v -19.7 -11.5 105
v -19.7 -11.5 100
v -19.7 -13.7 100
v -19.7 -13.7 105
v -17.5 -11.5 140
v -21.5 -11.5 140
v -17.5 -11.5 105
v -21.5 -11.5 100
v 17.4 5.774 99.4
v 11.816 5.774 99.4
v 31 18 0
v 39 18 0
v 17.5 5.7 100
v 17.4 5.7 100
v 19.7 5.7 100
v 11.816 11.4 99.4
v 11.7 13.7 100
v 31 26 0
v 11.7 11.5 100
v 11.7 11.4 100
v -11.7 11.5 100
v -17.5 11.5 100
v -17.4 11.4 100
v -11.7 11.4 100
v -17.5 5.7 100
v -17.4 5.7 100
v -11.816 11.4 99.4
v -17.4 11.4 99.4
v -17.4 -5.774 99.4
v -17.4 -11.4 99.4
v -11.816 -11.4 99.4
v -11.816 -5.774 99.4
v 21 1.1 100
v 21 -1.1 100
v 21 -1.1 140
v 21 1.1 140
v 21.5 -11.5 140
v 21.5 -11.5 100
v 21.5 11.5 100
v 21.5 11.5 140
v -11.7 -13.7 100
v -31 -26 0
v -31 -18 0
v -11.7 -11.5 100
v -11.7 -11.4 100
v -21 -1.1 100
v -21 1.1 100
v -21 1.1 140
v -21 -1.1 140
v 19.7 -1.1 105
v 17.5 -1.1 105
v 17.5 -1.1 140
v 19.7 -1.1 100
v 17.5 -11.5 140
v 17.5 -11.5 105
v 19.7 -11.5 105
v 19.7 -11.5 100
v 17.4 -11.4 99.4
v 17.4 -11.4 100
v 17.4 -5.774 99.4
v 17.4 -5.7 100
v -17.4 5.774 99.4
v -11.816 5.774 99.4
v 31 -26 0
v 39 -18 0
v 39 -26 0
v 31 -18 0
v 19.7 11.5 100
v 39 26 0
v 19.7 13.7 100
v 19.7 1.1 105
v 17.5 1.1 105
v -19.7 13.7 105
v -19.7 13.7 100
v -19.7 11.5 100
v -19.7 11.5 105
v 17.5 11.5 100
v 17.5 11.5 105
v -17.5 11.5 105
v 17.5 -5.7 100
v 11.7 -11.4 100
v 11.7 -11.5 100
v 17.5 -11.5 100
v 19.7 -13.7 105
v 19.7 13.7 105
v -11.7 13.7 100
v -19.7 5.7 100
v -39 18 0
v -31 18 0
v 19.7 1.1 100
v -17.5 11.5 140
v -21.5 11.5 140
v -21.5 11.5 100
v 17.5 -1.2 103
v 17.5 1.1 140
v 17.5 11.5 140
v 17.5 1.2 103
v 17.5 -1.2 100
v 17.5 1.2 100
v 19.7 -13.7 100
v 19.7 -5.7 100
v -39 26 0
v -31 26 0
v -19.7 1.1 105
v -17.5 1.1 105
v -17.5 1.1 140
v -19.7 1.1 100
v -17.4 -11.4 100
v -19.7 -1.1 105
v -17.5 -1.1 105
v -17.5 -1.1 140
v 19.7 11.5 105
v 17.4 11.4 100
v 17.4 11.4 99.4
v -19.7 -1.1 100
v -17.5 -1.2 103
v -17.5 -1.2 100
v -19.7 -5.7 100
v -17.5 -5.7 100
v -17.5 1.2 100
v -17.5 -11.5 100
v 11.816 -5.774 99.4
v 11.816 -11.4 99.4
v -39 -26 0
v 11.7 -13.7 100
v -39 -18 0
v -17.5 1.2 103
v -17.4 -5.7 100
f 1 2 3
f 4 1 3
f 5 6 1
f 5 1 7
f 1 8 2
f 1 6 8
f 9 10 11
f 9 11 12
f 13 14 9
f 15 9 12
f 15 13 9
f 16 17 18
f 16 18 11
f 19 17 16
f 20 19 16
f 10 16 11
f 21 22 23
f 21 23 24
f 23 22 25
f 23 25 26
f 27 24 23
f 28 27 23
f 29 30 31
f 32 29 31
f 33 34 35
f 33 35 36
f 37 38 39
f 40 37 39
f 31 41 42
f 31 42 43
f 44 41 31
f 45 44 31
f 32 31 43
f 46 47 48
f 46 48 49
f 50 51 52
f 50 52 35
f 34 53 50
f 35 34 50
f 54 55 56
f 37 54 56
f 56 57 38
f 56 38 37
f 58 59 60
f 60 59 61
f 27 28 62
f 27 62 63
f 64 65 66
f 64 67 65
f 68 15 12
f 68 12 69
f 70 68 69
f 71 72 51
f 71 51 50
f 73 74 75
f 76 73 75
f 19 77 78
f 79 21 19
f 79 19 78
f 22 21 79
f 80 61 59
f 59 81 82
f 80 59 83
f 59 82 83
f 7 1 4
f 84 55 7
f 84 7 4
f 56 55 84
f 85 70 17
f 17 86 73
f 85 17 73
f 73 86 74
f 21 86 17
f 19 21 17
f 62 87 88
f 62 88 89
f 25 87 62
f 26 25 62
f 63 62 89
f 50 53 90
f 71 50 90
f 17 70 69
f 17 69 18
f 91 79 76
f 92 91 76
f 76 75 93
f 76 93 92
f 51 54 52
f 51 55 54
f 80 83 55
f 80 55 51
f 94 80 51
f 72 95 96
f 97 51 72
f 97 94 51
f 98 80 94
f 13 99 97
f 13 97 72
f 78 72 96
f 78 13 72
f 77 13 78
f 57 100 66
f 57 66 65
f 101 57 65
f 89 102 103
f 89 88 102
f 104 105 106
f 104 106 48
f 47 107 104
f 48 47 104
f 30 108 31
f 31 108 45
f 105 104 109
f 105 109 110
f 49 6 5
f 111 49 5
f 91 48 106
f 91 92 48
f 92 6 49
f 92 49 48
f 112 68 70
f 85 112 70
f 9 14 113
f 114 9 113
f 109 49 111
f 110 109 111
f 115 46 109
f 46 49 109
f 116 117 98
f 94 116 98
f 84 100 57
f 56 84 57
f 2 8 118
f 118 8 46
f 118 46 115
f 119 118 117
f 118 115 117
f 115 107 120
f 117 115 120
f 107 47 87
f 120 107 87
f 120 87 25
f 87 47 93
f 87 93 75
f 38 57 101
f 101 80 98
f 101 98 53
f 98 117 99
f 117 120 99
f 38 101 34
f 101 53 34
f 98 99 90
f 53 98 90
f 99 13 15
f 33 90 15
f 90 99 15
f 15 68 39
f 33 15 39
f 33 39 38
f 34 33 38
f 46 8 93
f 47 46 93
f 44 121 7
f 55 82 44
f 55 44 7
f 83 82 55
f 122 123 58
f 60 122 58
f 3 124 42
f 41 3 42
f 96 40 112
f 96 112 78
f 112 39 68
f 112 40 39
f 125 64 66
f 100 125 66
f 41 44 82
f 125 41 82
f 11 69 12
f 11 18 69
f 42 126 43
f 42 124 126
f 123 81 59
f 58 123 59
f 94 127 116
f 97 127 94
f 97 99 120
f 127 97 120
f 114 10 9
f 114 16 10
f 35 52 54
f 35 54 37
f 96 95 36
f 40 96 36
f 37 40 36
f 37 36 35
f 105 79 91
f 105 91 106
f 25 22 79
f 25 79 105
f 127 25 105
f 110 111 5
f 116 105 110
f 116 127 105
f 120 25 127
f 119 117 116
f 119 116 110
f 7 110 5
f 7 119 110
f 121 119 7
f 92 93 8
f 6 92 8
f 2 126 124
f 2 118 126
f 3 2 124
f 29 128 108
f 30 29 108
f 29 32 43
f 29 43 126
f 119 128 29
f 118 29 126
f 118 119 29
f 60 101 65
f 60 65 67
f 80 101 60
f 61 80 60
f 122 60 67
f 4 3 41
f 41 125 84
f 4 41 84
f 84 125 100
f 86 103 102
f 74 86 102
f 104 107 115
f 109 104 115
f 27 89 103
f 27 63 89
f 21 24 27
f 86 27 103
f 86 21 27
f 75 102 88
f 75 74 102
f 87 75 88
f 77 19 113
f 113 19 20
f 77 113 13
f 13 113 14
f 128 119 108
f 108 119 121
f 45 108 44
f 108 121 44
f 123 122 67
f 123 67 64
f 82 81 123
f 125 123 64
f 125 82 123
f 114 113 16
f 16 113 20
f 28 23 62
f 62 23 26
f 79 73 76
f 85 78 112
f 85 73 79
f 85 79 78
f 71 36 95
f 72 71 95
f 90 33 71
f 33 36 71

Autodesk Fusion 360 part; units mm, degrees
ref_plane "WorkPlane1" through (0, 0, 100) normal (0, 0, 1) x (1, 0, 0)
ref_plane "WorkPlane2" through (0, 0, 100) normal (0, 0, 1) x (1, 0, 0)
ref_plane "WorkPlane3" through (0, 0, 100) normal (0, 0, 1) x (1, 0, 0)
ref_plane "WorkPlane4" through (0, 0, 100) normal (0, 0, 1) x (1, 0, 0)
ref_plane "WorkPlane5" through (0, 0, 100) normal (0, 0, 1) x (1, 0, 0)
ref_plane "WorkPlane6" through (0, 0, 100) normal (0, 0, 1) x (1, 0, 0)
ref_plane "WorkPlane7" through (0, 0, 100) normal (0, 0, 1) x (1, 0, 0)
ref_plane "WorkPlane8" through (0, 0, 100) normal (0, 0, 1) x (1, 0, 0)
ref_plane "WorkPlane9" through (0, 0, 100) normal (0, 0, 1) x (1, 0, 0)
ref_plane "WorkPlane10" through (0, 0, 100) normal (0, 0, 1) x (1, 0, 0)
ref_plane "WorkPlane11" through (0, 0, 100) normal (0, 0, 1) x (1, 0, 0)
ref_plane "WorkPlane12" through (0, 0, 100) normal (0, 0, 1) x (1, 0, 0)
ref_plane "WorkPlane13" through (0, 0, 100) normal (0, 0, 1) x (1, 0, 0)
ref_plane "WorkPlane14" through (0, 0, 100) normal (0, 0, 1) x (1, 0, 0)
ref_plane "WorkPlane15" through (0, 0, 100) normal (0, 0, 1) x (1, 0, 0)
ref_plane "WorkPlane16" through (0, 0, 100) normal (0, 0, 1) x (1, 0, 0)
ref_plane "WorkPlane18" through (0, 0, 100) normal (0, 0, 1) x (1, 0, 0)
ref_plane "WorkPlane20" through (0, 0, 100) normal (0, 0, 1) x (1, 0, 0)
ref_plane "WorkPlane21" through (0, 0, 105) normal (0, 0, 1) x (1, 0, 0)
ref_plane "WorkPlane22" through (0, 0, 100) normal (0, 0, 1) x (1, 0, 0)
ref_plane "WorkPlane23" through (0, 0, 105) normal (0, 0, 1) x (1, 0, 0)
ref_plane "WorkPlane25" through (0, 0, 105) normal (0, 0, 1) x (1, 0, 0)
ref_plane "WorkPlane26" through (0, 0, 100) normal (0, 0, 1) x (1, 0, 0)
ref_plane "WorkPlane27" through (0, 0, 100) normal (0, 0, 1) x (1, 0, 0)
ref_plane "WorkPlane28" through (0, 0, 105) normal (0, 0, 1) x (1, 0, 0)
ref_plane "WorkPlane29" through (0, 0, 100) normal (0, 0, 1) x (1, 0, 0)
ref_plane "WorkPlane31" through (0, 0, 105) normal (0, 0, 1) x (1, 0, 0)
ref_plane "WorkPlane32" through (0, 0, 100) normal (0, 0, 1) x (1, 0, 0)
ref_plane "WorkPlane33" through (0, 0, 105) normal (0, 0, 1) x (1, 0, 0)
ref_plane "WorkPlane34" through (0, 0, 0) normal (0, 0, 1) x (1, 0, 0)
ref_plane "WorkPlane35" through (0, 0, 0) normal (0, 0, 1) x (1, 0, 0)
ref_plane "WorkPlane36" through (0, 0, 0) normal (0, 0, 1) x (1, 0, 0)
ref_plane "WorkPlane37" through (0, 0, 0) normal (0, 0, 1) x (1, 0, 0)
ref_plane "WorkPlane38" through (0, 0, 100) normal (0, 0, 1) x (1, 0, 0)
ref_plane "WorkPlane39" through (0, 0, 100) normal (0, 0, 1) x (1, 0, 0)
ref_plane "WorkPlane40" through (0, 0, 105) normal (0, 0, 1) x (1, 0, 0)
ref_plane "WorkPlane41" through (0, 0, 0) normal (0, 0, 1) x (1, 0, 0)
ref_plane "WorkPlane42" through (0, 0, 0) normal (0, 0, 1) x (1, 0, 0)
ref_plane "WorkPlane43" through (0, 0, 0) normal (0, 0, 1) x (1, 0, 0)
ref_plane "WorkPlane44" through (0, 0, 0) normal (0, 0, 1) x (1, 0, 0)
ref_plane "WorkPlane45" through (0, 0, 100) normal (0, 0, 1) x (1, 0, 0)
ref_plane "WorkPlane46" through (0, 0, 100) normal (0, 0, 1) x (1, 0, 0)
ref_plane "WorkPlane47" through (0, 0, 100) normal (0, 0, 1) x (1, 0, 0)
ref_plane "WorkPlane48" through (0, 0, 100) normal (0, 0, 1) x (1, 0, 0)
ref_plane "WorkPlane49" through (0, 0, 0) normal (0, 0, 1) x (1, 0, 0)
ref_plane "WorkPlane50" through (0, 0, 100) normal (0, 0, 1) x (1, 0, 0)
ref_plane "WorkPlane51" through (0, 0, 0) normal (0, 0, 1) x (1, 0, 0)
ref_plane "WorkPlane52" through (0, 0, 100) normal (0, 0, 1) x (1, 0, 0)
ref_plane "WorkPlane53" through (0, 0, 0) normal (0, 0, 1) x (1, 0, 0)
ref_plane "WorkPlane54" through (0, 0, 100) normal (0, 0, 1) x (1, 0, 0)
ref_plane "WorkPlane55" through (0, 0, 0) normal (0, 0, 1) x (1, 0, 0)
ref_plane "WorkPlane56" through (0, 0, 100) normal (0, 0, 1) x (1, 0, 0)
ref_plane "WorkPlane57" through (0, 0, 100) normal (0, 0, 1) x (1, 0, 0)
ref_plane "WorkPlane58" through (0, 0, 0) normal (0, 0, 1) x (1, 0, 0)
ref_plane "WorkPlane59" through (0, 0, 100) normal (0, 0, 1) x (1, 0, 0)
sketch "Sketch240" plane through (0, 0, 0) normal (0, 0, 1) x (1, 0, 0)
  line L0 (31, 18) -> (39, 18)
  line L1 (39, 18) -> (39, 26)
  line L2 (39, 26) -> (31, 26)
  line L3 (31, 26) -> (31, 18)
sketch "Sketch241" plane through (0, 0, 100) normal (0, 0, 1) x (1, 0, 0)
  line L0 (11.7, 5.7) -> (19.7, 5.7)
  line L1 (19.7, 5.7) -> (19.7, 13.7)
  line L2 (19.7, 13.7) -> (11.7, 13.7)
  line L3 (11.7, 13.7) -> (11.7, 5.7)
loft "Loft97" add profiles "Sketch240", "Sketch241" section 1 section 2 makes body 1
ref_plane "WorkPlane60" through (0, 0, 0) normal (0, 0, 1) x (1, 0, 0)
ref_plane "WorkPlane61" through (0, 0, 100) normal (0, 0, 1) x (1, 0, 0)
sketch "Sketch242" plane through (0, 0, 0) normal (0, 0, 1) x (1, 0, 0)
  line L0 (-39, 18) -> (-31, 18)
  line L1 (-31, 18) -> (-31, 26)
  line L2 (-31, 26) -> (-39, 26)
  line L3 (-39, 26) -> (-39, 18)
sketch "Sketch243" plane through (0, 0, 100) normal (0, 0, 1) x (1, 0, 0)
  line L0 (-19.7, 5.7) -> (-11.7, 5.7)
  line L1 (-11.7, 5.7) -> (-11.7, 13.7)
  line L2 (-11.7, 13.7) -> (-19.7, 13.7)
  line L3 (-19.7, 13.7) -> (-19.7, 5.7)
loft "Loft98" add profiles "Sketch242", "Sketch243" section 1 section 2 separate body makes body 2
ref_plane "WorkPlane62" through (0, 0, 0) normal (0, 0, 1) x (1, 0, 0)
ref_plane "WorkPlane63" through (0, 0, 100) normal (0, 0, 1) x (1, 0, 0)
sketch "Sketch244" plane through (0, 0, 0) normal (0, 0, 1) x (1, 0, 0)
  line L0 (-39, -26) -> (-31, -26)
  line L1 (-31, -26) -> (-31, -18)
  line L2 (-31, -18) -> (-39, -18)
  line L3 (-39, -18) -> (-39, -26)
sketch "Sketch245" plane through (0, 0, 100) normal (0, 0, 1) x (1, 0, 0)
  line L0 (-19.7, -13.7) -> (-11.7, -13.7)
  line L1 (-11.7, -13.7) -> (-11.7, -5.7)
  line L2 (-11.7, -5.7) -> (-19.7, -5.7)
  line L3 (-19.7, -5.7) -> (-19.7, -13.7)
loft "Loft99" add profiles "Sketch244", "Sketch245" section 1 section 2 separate body makes body 3
ref_plane "WorkPlane64" through (0, 0, 0) normal (0, 0, 1) x (1, 0, 0)
ref_plane "WorkPlane65" through (0, 0, 100) normal (0, 0, 1) x (1, 0, 0)
sketch "Sketch246" plane through (0, 0, 0) normal (0, 0, 1) x (1, 0, 0)
  line L0 (31, -26) -> (39, -26)
  line L1 (39, -26) -> (39, -18)
  line L2 (39, -18) -> (31, -18)
  line L3 (31, -18) -> (31, -26)
sketch "Sketch247" plane through (0, 0, 100) normal (0, 0, 1) x (1, 0, 0)
  line L0 (11.7, -13.7) -> (19.7, -13.7)
  line L1 (19.7, -13.7) -> (19.7, -5.7)
  line L2 (19.7, -5.7) -> (11.7, -5.7)
  line L3 (11.7, -5.7) -> (11.7, -13.7)
loft "Loft100" add profiles "Sketch246", "Sketch247" section 1 section 2 separate body makes body 4
ref_plane "WorkPlane66" through (0, 0, 100) normal (0, 0, 1) x (1, 0, 0)
sketch "Sketch248" plane through (0, 0, 100) normal (0, 0, 1) x (1, 0, 0)
  line L0 (-19.7, -13.7) -> (19.7, -13.7)
  line L1 (19.7, -13.7) -> (19.7, 13.7)
  line L2 (19.7, 13.7) -> (-19.7, 13.7)
  line L3 (-19.7, 13.7) -> (-19.7, -13.7)
  line L4 (-17.5, -11.5) -> (17.5, -11.5)
  line L5 (17.5, -11.5) -> (17.5, 11.5)
  line L6 (17.5, 11.5) -> (-17.5, 11.5)
  line L7 (-17.5, 11.5) -> (-17.5, -11.5)
extrude "Extrude50" add sketch "Sketch248" along normal blind 5 bodies 1 2 3 4
ref_plane "WorkPlane67" through (0, 0, 105.1) normal (0, 0, 1) x (1, 0, 0)
sketch "sk_CutInner" plane through (0, 0, 105.1) normal (0, 0, 1) x (1, 0, 0)
  line L0 (-17.4, -11.4) -> (17.4, -11.4)
  line L1 (17.4, -11.4) -> (17.4, 11.4)
  line L2 (17.4, 11.4) -> (-17.4, 11.4)
  line L3 (-17.4, 11.4) -> (-17.4, -11.4)
extrude "Extrude51" cut sketch "sk_CutInner" against normal blind 5.7 bodies 1
sketch "sk_RailRight" plane through (0, 0, 0) normal (0, 0, 1) x (1, 0, 0)
  line L0 (17.5, -11.5) -> (21.5, -11.5)
  line L1 (21.5, -11.5) -> (21.5, 11.5)
  line L2 (21.5, 11.5) -> (17.5, 11.5)
  line L3 (17.5, 11.5) -> (17.5, -11.5)
extrude "Extrude52" add sketch "sk_RailRight" along normal blind 140 separate body makes body 5
sketch "sk_GrooveRight" plane through (0, 0, 0) normal (0, 0, 1) x (1, 0, 0)
  line L0 (17.5, -1.1) -> (21, -1.1)
  line L1 (21, -1.1) -> (21, 1.1)
  line L2 (21, 1.1) -> (17.5, 1.1)
  line L3 (17.5, 1.1) -> (17.5, -1.1)
extrude "Extrude53" cut sketch "sk_GrooveRight" along normal blind 140 bodies 5
sketch "sk_TrimRailRight" plane through (0, 0, 0) normal (0, 0, 1) x (1, 0, 0)
  line L0 (17.5, -11.5) -> (21.5, -11.5)
  line L1 (21.5, -11.5) -> (21.5, 11.5)
  line L2 (21.5, 11.5) -> (17.5, 11.5)
  line L3 (17.5, 11.5) -> (17.5, -11.5)
extrude "Extrude54" cut sketch "sk_TrimRailRight" along normal blind 100 bodies 5
sketch "sk_RailLeft" plane through (0, 0, 0) normal (0, 0, 1) x (1, 0, 0)
  line L0 (-21.5, -11.5) -> (-17.5, -11.5)
  line L1 (-17.5, -11.5) -> (-17.5, 11.5)
  line L2 (-17.5, 11.5) -> (-21.5, 11.5)
  line L3 (-21.5, 11.5) -> (-21.5, -11.5)
extrude "Extrude55" add sketch "sk_RailLeft" along normal blind 140 separate body makes body 6
sketch "sk_GrooveLeft" plane through (0, 0, 0) normal (0, 0, 1) x (1, 0, 0)
  line L0 (-21, -1.1) -> (-17.5, -1.1)
  line L1 (-17.5, -1.1) -> (-17.5, 1.1)
  line L2 (-17.5, 1.1) -> (-21, 1.1)
  line L3 (-21, 1.1) -> (-21, -1.1)
extrude "Extrude56" cut sketch "sk_GrooveLeft" along normal blind 140 bodies 6
sketch "sk_TrimRailLeft" plane through (0, 0, 0) normal (0, 0, 1) x (1, 0, 0)
  line L0 (-21.5, -11.5) -> (-17.5, -11.5)
  line L1 (-17.5, -11.5) -> (-17.5, 11.5)
  line L2 (-17.5, 11.5) -> (-21.5, 11.5)
  line L3 (-21.5, 11.5) -> (-21.5, -11.5)
extrude "Extrude57" cut sketch "sk_TrimRailLeft" along normal blind 100 bodies 6
sketch "sk_BottomStop" plane through (0, 0, 0) normal (0, 0, 1) x (1, 0, 0)
  line L0 (-17.5, -1.2) -> (17.5, -1.2)
  line L1 (17.5, -1.2) -> (17.5, 1.2)
  line L2 (17.5, 1.2) -> (-17.5, 1.2)
  line L3 (-17.5, 1.2) -> (-17.5, -1.2)
extrude "Extrude58" add sketch "sk_BottomStop" along normal blind 103 separate body makes body 7
sketch "sk_TrimStop" plane through (0, 0, 0) normal (0, 0, 1) x (1, 0, 0)
  line L0 (-17.5, -1.2) -> (17.5, -1.2)
  line L1 (17.5, -1.2) -> (17.5, 1.2)
  line L2 (17.5, 1.2) -> (-17.5, 1.2)
  line L3 (-17.5, 1.2) -> (-17.5, -1.2)
extrude "Extrude59" cut sketch "sk_TrimStop" along normal blind 100 bodies 7
combine "Combine1" operation add target body 1 tool bodies 5 6 7
